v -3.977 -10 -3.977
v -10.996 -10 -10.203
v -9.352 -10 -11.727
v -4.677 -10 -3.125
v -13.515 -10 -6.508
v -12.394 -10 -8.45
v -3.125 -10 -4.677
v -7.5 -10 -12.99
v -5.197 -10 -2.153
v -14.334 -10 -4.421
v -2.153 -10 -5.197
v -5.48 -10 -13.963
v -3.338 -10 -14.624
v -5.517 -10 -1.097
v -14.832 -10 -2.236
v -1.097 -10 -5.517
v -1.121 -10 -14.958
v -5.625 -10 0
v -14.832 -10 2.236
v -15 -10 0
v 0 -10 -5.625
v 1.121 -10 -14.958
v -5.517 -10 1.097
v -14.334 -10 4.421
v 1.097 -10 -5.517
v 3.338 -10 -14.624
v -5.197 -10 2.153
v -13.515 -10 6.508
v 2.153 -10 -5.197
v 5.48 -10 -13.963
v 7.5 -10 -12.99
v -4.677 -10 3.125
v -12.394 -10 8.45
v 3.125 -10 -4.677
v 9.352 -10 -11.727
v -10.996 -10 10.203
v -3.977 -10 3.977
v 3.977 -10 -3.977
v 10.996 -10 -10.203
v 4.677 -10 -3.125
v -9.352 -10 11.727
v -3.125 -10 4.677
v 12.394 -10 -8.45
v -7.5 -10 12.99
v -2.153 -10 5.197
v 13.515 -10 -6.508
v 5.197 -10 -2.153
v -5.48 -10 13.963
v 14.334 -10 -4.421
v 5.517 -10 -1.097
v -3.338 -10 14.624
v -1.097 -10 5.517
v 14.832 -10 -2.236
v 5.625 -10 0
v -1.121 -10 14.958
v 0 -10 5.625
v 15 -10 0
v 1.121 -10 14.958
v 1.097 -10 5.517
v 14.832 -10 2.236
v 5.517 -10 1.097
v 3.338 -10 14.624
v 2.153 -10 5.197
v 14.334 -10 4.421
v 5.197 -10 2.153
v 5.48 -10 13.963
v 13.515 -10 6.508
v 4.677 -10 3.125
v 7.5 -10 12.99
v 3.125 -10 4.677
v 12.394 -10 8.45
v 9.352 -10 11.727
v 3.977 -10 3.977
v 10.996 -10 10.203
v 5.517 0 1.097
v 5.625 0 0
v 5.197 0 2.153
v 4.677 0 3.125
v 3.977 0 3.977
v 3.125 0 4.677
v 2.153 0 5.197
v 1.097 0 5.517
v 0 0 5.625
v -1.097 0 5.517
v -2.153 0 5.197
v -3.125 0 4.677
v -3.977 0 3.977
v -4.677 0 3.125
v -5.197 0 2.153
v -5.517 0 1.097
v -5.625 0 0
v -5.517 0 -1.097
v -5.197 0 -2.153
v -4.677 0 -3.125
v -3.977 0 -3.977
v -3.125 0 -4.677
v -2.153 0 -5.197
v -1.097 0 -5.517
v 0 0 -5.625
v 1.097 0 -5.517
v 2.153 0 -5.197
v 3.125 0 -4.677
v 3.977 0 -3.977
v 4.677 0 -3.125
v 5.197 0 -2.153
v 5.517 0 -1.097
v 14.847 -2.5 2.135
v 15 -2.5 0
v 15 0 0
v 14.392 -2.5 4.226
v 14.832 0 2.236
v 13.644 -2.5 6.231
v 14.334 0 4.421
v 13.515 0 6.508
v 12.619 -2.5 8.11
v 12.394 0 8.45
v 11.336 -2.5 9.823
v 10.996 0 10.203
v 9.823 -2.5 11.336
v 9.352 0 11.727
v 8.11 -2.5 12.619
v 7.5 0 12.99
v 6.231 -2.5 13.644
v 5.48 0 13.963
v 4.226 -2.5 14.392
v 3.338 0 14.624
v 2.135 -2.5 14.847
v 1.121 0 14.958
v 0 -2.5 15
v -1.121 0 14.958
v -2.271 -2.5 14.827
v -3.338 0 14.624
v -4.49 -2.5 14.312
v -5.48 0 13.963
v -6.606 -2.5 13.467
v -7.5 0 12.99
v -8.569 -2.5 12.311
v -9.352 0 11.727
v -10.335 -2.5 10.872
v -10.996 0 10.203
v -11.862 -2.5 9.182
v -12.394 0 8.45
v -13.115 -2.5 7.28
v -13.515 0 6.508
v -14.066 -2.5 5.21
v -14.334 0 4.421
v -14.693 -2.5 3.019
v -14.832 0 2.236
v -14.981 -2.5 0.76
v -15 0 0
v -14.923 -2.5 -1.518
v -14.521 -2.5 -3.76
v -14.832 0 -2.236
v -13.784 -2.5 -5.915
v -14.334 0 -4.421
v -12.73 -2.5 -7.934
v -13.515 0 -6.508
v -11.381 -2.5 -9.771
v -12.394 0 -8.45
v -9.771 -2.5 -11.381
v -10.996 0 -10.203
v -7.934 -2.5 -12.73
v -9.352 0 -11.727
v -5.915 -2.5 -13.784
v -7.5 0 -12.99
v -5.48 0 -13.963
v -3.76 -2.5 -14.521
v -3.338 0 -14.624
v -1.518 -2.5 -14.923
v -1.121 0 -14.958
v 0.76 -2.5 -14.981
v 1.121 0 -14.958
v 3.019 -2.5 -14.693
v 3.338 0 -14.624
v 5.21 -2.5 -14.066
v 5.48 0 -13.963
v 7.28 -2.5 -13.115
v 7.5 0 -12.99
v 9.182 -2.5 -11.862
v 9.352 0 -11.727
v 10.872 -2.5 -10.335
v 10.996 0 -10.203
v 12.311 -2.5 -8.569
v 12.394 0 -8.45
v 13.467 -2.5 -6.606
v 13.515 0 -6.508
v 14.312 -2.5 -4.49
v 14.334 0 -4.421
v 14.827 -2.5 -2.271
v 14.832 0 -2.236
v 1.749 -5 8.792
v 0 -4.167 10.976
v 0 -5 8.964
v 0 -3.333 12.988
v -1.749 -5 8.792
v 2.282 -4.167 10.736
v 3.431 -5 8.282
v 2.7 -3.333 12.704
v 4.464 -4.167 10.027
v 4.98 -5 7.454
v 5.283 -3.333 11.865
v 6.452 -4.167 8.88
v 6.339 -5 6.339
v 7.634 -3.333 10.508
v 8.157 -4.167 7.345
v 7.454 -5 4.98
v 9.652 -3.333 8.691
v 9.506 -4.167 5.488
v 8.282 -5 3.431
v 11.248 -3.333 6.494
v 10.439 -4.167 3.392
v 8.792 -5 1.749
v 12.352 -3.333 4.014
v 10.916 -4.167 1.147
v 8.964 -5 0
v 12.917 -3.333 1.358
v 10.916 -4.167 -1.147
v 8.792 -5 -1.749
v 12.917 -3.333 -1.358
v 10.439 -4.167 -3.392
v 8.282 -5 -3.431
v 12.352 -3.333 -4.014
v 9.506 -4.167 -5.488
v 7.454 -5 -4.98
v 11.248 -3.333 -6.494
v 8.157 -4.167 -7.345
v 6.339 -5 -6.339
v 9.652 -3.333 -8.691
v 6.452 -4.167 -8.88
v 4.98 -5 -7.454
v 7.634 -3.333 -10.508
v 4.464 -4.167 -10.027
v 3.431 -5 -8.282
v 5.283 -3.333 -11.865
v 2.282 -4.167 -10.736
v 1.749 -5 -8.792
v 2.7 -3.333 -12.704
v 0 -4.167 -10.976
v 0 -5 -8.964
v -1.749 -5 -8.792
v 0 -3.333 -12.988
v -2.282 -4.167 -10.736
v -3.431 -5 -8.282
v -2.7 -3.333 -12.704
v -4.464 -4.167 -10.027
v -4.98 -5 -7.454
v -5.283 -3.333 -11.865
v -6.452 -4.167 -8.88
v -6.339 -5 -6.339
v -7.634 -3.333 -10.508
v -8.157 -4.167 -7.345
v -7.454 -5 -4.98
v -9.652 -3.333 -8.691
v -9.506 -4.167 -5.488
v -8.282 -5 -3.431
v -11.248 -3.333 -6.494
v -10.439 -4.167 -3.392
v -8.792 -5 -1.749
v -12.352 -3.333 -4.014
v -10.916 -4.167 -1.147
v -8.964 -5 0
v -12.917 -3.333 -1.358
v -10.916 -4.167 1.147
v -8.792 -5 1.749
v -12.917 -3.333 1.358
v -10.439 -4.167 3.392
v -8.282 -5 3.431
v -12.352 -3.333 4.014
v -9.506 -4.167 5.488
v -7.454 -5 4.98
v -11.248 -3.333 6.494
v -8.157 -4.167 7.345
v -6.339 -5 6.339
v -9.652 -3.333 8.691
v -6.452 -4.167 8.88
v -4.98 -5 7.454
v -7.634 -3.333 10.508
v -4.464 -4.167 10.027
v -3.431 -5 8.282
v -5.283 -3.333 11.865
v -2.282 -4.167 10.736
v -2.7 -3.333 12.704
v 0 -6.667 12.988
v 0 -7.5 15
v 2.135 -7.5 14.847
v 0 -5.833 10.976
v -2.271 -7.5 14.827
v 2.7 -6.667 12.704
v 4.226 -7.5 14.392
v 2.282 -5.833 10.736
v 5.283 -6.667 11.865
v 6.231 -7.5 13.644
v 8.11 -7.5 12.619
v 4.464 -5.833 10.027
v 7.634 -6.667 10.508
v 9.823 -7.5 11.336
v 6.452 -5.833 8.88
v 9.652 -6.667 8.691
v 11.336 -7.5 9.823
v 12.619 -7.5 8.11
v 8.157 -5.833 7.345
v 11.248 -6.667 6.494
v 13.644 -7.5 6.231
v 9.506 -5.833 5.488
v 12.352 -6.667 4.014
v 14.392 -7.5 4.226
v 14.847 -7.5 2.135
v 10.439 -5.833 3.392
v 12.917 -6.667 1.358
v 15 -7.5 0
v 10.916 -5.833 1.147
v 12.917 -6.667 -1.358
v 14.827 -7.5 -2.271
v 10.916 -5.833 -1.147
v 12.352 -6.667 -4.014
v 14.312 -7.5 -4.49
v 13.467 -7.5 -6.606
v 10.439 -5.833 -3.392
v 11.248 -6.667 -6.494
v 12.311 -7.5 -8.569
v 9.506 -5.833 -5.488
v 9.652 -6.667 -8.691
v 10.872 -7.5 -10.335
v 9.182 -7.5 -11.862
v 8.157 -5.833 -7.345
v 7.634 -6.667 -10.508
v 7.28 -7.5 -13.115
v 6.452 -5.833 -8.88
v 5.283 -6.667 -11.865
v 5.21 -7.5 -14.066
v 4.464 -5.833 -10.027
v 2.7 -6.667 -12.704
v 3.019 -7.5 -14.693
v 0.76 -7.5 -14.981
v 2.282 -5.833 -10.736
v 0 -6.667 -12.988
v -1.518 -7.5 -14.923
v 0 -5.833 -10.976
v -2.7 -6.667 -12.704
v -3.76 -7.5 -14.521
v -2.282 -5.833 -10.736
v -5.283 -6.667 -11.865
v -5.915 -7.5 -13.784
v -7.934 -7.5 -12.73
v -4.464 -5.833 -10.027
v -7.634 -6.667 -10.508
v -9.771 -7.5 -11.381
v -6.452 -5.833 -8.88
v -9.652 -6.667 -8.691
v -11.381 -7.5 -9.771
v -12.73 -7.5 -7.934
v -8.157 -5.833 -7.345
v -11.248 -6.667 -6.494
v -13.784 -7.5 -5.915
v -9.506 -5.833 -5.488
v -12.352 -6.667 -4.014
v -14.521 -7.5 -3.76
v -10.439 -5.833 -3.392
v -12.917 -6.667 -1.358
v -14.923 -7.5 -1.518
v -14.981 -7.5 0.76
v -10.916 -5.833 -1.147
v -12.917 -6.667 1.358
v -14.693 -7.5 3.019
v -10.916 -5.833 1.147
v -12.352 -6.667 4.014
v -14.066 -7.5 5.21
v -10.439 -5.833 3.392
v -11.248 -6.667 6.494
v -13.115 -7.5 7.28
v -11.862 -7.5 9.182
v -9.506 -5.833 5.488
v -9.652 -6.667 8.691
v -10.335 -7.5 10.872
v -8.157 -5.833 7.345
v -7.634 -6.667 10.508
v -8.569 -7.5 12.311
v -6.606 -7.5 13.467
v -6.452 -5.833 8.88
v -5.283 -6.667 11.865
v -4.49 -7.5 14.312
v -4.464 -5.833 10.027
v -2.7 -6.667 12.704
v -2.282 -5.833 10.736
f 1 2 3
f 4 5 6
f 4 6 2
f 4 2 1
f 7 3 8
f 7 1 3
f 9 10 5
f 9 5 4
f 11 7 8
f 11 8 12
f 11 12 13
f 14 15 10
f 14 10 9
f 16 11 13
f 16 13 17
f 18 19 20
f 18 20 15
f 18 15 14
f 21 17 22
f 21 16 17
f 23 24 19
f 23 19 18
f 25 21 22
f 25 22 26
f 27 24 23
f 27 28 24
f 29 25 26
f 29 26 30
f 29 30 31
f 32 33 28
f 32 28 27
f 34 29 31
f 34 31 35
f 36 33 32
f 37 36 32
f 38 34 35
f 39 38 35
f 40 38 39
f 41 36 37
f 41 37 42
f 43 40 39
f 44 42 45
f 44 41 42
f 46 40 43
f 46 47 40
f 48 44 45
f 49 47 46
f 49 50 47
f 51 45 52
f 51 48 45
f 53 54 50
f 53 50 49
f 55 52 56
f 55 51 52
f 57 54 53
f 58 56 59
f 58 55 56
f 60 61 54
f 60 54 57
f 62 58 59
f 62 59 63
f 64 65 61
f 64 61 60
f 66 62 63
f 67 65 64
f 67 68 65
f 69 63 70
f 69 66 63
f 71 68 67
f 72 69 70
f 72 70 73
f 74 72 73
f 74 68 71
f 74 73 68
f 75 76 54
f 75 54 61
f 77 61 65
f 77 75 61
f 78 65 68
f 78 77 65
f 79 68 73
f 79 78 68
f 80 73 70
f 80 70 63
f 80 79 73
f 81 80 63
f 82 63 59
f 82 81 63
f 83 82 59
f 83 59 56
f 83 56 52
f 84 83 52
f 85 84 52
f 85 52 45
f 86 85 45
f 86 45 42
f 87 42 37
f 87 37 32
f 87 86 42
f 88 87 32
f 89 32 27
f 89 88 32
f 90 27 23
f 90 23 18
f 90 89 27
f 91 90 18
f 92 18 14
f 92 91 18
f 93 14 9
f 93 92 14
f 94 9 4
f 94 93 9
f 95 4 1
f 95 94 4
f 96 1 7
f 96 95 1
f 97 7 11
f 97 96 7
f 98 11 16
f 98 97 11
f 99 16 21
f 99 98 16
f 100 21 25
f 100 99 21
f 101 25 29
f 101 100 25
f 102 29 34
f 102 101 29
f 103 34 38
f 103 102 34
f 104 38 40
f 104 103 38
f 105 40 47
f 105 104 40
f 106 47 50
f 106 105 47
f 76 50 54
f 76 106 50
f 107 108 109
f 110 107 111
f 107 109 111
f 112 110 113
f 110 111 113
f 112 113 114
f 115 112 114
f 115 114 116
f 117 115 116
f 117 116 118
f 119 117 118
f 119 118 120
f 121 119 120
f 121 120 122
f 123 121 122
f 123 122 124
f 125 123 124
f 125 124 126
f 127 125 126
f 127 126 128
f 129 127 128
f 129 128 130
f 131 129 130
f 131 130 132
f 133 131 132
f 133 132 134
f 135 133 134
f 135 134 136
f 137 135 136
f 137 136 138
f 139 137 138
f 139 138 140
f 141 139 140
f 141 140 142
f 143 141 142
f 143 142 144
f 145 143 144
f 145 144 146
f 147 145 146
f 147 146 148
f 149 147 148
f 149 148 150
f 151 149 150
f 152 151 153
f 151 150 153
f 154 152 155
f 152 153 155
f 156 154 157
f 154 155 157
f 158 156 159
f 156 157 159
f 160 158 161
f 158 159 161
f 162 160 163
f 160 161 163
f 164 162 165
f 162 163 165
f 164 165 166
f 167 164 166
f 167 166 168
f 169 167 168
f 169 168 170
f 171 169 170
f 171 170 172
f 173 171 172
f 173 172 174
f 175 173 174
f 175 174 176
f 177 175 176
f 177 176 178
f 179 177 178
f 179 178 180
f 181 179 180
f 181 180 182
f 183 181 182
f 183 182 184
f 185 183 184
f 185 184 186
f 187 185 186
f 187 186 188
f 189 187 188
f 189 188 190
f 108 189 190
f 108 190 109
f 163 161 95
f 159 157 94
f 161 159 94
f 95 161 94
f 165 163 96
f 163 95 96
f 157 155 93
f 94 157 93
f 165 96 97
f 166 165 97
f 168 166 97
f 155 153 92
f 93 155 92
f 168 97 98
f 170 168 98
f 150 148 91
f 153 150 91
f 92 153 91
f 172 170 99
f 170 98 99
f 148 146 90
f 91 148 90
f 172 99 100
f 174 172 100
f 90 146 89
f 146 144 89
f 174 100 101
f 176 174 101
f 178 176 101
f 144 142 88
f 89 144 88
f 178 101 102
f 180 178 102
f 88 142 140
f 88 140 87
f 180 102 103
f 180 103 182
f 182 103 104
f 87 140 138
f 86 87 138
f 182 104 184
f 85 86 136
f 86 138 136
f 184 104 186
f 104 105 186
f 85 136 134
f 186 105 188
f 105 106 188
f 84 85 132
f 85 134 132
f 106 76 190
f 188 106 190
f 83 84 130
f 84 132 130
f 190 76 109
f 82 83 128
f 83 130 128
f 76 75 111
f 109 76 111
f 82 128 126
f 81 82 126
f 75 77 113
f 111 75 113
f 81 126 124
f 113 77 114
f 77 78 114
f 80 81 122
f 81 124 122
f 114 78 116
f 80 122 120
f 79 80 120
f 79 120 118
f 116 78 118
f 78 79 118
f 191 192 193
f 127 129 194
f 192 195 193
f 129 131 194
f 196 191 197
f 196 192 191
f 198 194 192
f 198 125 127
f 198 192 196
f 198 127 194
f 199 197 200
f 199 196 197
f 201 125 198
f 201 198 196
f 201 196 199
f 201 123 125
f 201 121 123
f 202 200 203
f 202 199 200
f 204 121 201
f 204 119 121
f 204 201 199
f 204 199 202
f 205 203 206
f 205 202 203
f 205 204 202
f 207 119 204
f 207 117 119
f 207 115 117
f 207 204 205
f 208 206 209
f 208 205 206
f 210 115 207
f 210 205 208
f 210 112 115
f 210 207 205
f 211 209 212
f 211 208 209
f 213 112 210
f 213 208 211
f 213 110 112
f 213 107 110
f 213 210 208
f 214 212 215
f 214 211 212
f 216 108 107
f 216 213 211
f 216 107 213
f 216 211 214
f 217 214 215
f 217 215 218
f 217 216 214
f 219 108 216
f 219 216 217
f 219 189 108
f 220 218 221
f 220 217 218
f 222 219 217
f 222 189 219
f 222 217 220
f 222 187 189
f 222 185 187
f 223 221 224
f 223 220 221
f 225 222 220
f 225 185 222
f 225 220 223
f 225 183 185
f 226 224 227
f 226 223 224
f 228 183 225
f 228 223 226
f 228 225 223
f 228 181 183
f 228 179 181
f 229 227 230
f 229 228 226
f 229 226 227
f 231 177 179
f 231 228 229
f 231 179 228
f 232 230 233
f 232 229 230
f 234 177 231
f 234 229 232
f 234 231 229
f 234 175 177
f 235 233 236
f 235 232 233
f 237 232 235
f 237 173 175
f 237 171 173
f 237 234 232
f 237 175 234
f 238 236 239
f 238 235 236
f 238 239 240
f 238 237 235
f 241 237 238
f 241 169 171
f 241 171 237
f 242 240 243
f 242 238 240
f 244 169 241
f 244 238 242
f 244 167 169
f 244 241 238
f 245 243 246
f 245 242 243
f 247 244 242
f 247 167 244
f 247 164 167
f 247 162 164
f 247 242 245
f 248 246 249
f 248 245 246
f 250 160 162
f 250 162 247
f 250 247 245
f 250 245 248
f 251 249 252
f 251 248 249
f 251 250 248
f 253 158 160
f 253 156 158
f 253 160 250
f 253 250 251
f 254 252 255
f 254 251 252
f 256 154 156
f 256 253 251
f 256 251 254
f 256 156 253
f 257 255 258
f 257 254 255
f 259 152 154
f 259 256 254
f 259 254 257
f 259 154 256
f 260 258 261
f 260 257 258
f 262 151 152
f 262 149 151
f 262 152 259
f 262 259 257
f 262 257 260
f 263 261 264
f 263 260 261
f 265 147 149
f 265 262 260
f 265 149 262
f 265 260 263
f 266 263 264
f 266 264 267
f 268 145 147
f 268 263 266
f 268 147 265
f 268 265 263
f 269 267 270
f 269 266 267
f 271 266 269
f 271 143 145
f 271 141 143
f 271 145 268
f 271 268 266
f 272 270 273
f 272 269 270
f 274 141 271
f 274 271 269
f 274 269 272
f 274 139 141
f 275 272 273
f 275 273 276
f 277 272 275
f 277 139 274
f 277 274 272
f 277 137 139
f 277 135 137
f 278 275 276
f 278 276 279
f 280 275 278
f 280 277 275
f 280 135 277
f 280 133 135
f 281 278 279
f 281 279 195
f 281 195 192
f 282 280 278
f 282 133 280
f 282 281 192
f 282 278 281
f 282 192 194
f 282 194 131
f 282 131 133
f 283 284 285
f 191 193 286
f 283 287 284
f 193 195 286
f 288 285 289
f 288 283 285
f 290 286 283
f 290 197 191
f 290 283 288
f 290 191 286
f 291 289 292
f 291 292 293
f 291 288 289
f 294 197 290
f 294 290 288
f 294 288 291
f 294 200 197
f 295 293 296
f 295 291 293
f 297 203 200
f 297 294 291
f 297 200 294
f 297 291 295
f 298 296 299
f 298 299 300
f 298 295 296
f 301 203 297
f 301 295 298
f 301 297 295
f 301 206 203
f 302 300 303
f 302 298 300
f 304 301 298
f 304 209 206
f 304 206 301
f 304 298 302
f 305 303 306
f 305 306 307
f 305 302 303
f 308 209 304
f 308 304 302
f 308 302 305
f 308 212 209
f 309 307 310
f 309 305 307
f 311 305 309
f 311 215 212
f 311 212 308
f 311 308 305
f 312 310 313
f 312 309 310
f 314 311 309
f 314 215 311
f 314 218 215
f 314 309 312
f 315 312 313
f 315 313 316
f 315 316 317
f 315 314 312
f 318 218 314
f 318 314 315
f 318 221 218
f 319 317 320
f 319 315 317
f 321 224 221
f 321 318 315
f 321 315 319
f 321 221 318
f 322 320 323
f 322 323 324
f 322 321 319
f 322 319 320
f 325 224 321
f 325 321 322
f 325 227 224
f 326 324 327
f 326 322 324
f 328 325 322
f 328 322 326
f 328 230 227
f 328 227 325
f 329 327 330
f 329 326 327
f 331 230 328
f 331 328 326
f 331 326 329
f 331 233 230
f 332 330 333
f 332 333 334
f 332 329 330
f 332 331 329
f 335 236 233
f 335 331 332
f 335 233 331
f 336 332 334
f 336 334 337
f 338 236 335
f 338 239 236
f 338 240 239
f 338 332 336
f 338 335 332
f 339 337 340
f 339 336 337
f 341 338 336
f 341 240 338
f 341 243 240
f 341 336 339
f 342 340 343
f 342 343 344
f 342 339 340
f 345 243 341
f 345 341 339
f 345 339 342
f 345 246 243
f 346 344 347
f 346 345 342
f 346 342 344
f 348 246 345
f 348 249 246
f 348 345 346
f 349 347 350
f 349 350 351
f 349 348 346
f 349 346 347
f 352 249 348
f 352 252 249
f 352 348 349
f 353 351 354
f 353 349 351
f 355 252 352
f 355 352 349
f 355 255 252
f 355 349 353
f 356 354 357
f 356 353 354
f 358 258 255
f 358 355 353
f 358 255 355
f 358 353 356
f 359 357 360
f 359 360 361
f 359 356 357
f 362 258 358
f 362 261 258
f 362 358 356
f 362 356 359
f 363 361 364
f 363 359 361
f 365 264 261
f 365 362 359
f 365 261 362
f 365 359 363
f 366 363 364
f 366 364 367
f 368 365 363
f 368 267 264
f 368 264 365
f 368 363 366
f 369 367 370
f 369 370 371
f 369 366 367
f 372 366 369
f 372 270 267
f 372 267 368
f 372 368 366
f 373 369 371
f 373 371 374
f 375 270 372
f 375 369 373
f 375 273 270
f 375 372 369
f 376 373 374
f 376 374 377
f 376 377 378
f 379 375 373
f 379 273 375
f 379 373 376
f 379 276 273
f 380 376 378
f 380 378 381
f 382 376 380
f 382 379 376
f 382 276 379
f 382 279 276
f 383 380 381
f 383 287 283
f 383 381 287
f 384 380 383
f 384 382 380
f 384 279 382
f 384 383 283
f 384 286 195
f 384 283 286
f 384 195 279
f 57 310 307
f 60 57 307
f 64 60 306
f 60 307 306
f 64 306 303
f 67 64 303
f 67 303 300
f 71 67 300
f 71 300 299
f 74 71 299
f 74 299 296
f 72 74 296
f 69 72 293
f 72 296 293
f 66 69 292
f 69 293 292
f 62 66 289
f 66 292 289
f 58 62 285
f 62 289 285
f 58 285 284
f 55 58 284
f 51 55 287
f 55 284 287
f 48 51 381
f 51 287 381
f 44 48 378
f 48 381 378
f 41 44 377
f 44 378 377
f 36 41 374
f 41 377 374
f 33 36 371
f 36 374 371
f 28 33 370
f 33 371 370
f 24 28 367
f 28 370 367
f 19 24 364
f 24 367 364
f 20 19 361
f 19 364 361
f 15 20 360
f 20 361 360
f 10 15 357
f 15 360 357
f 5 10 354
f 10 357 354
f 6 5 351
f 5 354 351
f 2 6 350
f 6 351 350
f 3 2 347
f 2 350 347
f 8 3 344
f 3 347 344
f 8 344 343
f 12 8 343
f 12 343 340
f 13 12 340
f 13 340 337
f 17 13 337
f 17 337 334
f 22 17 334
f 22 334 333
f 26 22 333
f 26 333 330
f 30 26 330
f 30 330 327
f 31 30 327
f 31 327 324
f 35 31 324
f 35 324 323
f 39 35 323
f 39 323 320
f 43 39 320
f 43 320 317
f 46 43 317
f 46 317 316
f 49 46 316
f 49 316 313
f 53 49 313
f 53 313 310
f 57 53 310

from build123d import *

# Parameters (mm, degrees)
F0_R     = 15
F0_R_2   = 5.625
F1_DEPTH = 10


with BuildPart() as f1:
    # F0 (on Front) → F1 (new body)
    with BuildSketch(Plane.XZ):
        Circle(F0_R)
        Circle(F0_R_2, mode=Mode.SUBTRACT)
    extrude(amount=F1_DEPTH)

    # F3 (on offset) → F4 (revolve, cut)
    with BuildSketch(Plane.YZ):
        Polygon((-2.5, 15), (-7.5, 15), (-5, 8.964466), align=None)
    revolve(axis=Axis((0, 0, 0), (0, 1, 0)), mode=Mode.SUBTRACT)


solid = f1.part
